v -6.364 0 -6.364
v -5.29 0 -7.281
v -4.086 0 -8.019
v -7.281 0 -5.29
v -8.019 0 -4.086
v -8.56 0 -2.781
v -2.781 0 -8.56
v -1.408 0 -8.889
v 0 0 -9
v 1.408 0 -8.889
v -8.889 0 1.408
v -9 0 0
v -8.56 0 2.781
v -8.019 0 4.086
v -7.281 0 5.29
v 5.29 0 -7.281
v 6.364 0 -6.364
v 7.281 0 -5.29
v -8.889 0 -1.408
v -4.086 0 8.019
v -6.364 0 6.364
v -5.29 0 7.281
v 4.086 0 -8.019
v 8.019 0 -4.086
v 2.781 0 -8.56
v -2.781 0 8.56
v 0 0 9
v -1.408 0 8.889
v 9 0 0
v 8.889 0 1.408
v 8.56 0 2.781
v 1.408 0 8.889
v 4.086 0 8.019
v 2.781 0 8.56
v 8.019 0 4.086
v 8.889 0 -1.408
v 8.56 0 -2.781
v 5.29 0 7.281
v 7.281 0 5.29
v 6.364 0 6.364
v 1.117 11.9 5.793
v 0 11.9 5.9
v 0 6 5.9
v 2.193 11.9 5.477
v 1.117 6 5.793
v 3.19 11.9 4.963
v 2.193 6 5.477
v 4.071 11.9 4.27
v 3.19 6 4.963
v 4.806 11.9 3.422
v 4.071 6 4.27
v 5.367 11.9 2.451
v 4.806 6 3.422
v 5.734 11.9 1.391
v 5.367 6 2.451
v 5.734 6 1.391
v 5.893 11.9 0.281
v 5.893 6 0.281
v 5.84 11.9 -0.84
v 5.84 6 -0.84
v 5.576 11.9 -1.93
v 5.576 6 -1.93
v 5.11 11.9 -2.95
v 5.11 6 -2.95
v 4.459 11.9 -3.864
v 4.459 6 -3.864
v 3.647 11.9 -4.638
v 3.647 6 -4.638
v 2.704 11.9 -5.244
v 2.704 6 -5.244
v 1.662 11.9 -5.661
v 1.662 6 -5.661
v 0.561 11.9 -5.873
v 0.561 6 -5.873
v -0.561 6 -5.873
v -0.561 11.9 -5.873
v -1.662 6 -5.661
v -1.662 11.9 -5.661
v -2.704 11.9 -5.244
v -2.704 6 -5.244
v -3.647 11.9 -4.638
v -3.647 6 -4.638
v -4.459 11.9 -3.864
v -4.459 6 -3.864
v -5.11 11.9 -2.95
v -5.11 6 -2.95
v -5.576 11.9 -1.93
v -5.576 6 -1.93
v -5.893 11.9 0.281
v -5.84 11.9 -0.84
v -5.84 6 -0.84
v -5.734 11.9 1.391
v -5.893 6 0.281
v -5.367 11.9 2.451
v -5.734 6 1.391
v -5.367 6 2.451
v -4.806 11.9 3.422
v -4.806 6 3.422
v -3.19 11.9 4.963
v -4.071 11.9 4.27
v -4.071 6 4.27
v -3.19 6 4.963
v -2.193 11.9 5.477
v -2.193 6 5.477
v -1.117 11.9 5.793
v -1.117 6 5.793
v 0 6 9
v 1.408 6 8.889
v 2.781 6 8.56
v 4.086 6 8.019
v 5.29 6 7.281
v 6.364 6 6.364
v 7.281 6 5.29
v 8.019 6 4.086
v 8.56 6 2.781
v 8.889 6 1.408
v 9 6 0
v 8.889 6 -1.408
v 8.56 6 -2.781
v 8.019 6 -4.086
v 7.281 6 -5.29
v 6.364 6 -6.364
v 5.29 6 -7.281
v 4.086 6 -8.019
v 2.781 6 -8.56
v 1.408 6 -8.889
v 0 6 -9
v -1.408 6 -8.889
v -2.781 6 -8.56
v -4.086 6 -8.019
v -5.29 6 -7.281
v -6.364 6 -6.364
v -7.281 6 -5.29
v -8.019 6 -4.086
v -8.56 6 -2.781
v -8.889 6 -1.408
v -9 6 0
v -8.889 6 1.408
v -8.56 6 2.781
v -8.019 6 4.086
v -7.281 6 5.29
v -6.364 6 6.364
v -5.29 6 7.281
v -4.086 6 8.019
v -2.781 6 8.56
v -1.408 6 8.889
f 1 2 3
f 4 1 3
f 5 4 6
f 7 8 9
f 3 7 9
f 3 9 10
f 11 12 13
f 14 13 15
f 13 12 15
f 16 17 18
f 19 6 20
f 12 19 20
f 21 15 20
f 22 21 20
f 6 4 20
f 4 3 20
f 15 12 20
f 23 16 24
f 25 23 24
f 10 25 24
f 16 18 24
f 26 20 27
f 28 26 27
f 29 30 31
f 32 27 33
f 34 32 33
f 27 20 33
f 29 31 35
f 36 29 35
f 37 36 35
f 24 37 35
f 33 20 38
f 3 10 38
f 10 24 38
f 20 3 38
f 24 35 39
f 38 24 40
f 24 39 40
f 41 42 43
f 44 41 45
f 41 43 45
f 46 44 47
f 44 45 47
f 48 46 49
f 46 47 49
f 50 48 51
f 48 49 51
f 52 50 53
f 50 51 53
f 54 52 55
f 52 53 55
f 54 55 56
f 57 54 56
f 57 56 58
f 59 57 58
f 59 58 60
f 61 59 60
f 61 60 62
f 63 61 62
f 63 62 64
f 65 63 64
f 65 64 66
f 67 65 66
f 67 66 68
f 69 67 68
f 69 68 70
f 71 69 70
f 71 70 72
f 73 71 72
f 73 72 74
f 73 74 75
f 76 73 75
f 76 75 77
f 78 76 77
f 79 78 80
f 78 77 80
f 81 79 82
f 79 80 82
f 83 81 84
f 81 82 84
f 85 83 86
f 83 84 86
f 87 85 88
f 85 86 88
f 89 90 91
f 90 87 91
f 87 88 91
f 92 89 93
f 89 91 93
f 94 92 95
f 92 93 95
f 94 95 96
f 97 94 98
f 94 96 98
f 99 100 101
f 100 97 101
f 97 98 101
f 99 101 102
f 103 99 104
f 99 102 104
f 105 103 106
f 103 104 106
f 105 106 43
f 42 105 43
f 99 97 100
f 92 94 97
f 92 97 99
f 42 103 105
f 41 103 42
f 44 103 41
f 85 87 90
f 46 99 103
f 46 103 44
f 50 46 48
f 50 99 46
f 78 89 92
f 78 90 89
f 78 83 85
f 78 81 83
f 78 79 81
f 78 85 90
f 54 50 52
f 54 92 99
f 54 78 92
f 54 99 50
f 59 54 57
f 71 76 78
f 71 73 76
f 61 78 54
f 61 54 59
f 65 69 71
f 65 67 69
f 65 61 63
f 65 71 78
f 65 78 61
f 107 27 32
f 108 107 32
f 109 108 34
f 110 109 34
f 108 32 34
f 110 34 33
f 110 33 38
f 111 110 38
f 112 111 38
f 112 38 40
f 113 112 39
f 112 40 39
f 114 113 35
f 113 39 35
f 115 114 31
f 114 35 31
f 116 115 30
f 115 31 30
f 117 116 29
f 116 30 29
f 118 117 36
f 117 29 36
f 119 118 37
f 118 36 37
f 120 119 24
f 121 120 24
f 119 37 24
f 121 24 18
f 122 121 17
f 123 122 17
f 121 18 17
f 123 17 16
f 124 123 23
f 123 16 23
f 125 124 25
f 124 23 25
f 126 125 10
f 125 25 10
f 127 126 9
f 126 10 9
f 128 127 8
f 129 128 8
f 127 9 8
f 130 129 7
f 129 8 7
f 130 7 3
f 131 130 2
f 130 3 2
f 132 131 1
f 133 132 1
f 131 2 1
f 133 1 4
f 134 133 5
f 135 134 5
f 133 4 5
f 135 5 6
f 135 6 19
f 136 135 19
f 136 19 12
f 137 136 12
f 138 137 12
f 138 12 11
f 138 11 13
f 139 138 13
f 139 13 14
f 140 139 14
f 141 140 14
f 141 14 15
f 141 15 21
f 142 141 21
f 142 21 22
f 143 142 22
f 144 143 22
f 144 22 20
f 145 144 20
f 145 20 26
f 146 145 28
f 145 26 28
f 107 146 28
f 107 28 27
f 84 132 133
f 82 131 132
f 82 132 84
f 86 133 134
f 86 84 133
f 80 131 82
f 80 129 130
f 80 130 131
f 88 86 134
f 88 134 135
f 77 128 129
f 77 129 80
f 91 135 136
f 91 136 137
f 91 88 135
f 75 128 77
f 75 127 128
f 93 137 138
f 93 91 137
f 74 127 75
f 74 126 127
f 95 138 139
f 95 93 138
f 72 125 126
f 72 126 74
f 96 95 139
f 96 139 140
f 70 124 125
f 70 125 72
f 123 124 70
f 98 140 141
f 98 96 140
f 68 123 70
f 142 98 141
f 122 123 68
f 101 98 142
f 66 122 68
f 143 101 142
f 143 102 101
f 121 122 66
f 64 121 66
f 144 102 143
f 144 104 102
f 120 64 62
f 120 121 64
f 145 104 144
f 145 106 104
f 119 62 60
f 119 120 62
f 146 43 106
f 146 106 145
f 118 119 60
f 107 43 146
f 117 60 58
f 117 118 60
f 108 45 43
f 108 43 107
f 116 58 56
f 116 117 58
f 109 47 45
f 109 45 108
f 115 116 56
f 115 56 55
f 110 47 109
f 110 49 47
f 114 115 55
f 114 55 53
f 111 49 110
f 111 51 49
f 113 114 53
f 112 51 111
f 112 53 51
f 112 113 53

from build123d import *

# Parameters (mm, degrees)
SKETCH1_R           = 9
BOSS_EXTRUDE1_DEPTH = 6
SKETCH2_R           = 5.9
BOSS_EXTRUDE2_DEPTH = 20
SKETCH5_R           = 9.837832021
CUT_EXTRUDE3_DEPTH  = 14.1


with BuildPart() as part:
    # Sketch1 → Boss-Extrude1 (new body)
    with BuildSketch(Plane(origin=(0, 0, 0), x_dir=(1, 0, 0), z_dir=(0, 1, 0))):
        with Locations(Location((0, 0, 0), (0, 0, 270))):
            Circle(SKETCH1_R)
    extrude(amount=BOSS_EXTRUDE1_DEPTH)

    # Sketch2 → Boss-Extrude2 (add)
    with BuildSketch(Plane(origin=(0, 6, 0), x_dir=(1, 0, 0), z_dir=(0, 1, 0))):
        with Locations(Location((0, 0, 0), (0, 0, 270))):
            Circle(SKETCH2_R)
    extrude(amount=BOSS_EXTRUDE2_DEPTH)

    # Sketch5 → Cut-Extrude3 (cut)
    with BuildSketch(Plane(origin=(0, 26, 0), x_dir=(1, 0, 0), z_dir=(0, 1, 0))):
        Circle(SKETCH5_R)
    extrude(amount=-CUT_EXTRUDE3_DEPTH, mode=Mode.SUBTRACT)


solid = part.part
